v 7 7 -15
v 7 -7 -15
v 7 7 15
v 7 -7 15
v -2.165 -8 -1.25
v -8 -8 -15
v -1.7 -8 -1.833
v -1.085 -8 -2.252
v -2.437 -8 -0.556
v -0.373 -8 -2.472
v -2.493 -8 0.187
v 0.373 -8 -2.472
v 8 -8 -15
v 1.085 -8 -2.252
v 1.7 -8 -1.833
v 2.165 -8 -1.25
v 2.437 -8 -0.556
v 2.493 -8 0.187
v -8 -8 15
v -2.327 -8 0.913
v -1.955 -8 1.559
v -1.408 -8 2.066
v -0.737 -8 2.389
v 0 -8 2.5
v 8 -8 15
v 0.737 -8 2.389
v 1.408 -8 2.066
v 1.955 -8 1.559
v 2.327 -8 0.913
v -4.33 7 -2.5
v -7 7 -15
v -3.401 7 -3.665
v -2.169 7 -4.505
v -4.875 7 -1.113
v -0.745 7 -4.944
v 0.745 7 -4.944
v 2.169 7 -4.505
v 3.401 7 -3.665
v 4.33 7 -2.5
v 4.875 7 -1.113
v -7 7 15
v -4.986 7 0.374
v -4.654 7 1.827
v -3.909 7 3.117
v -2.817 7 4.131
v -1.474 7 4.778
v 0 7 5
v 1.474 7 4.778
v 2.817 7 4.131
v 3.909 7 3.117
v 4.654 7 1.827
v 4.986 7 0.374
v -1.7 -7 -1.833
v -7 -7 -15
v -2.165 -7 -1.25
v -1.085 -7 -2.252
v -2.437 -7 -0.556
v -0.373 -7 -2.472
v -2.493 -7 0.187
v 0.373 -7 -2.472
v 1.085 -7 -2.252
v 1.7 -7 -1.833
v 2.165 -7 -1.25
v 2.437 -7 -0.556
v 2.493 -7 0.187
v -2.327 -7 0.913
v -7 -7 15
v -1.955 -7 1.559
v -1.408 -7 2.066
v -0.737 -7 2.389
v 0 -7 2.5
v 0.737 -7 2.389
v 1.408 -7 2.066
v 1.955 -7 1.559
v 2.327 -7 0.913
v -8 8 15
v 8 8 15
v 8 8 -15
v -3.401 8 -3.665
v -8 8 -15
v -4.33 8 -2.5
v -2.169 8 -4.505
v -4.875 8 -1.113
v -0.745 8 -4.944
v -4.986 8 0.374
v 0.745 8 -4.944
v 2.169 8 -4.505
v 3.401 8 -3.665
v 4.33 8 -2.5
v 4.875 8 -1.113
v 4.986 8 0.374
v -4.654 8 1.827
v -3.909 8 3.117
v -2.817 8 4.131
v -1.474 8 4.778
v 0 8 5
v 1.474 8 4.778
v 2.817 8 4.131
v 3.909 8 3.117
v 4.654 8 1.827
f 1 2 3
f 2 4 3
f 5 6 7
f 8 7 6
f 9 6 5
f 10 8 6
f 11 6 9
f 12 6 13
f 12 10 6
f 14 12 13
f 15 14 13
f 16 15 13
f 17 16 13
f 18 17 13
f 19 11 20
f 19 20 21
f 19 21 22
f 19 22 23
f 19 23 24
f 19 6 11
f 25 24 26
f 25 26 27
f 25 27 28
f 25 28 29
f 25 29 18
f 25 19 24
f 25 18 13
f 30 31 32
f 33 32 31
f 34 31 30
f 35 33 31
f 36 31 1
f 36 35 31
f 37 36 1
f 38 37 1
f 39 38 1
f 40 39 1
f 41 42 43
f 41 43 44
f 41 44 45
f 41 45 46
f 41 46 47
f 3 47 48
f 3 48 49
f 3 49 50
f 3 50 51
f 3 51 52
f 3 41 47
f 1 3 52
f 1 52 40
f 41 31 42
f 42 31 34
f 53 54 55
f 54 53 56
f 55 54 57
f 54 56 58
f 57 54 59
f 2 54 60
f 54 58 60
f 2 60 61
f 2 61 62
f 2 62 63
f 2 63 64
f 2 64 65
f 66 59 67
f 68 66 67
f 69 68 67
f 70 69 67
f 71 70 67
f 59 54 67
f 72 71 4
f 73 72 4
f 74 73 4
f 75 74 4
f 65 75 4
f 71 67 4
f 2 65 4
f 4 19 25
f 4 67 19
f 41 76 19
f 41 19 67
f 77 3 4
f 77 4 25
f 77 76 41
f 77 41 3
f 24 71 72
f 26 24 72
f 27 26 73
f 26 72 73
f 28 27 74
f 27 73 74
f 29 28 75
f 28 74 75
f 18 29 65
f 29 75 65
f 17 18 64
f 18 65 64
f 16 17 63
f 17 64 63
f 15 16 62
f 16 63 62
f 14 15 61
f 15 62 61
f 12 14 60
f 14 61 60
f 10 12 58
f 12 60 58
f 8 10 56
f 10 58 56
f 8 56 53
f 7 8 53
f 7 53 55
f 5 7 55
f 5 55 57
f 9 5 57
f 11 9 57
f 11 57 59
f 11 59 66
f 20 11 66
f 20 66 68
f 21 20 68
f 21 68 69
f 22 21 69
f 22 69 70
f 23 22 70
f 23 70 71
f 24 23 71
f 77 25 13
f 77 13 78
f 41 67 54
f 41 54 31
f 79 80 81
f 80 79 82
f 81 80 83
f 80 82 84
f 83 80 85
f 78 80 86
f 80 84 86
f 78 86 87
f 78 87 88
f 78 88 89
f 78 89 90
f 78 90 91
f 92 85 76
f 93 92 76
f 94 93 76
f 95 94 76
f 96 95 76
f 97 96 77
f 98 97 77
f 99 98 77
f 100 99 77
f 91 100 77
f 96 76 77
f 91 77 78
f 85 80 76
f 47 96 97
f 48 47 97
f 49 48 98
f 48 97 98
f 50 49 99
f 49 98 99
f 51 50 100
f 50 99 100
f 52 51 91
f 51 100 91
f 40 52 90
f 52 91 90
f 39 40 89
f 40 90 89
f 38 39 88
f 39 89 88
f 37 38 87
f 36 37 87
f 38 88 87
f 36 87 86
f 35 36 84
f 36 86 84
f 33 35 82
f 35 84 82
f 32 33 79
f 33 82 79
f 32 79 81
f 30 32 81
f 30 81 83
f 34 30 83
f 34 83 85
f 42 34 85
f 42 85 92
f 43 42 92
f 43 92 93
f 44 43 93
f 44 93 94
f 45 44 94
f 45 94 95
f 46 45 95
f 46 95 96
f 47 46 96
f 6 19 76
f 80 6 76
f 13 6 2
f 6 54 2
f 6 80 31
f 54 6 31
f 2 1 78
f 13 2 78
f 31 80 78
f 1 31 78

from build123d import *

# Parameters (mm, degrees)
SKIZZE1_W                       = 16
SKIZZE1_H                       = 16
SKIZZE1_W_2                     = 14
SKIZZE1_H_2                     = 14
AUFSATZ_LINEAR_AUSTRAGEN1_DEPTH = 15
SKIZZE2_R                       = 2.5
SCHNITT_LINEAR_AUSTRAGEN1_DEPTH = 30
SKIZZE3_R                       = 5
SCHNITT_LINEAR_AUSTRAGEN2_DEPTH = 5


with BuildPart() as part:
    # Skizze1 → Aufsatz-Linear austragen1 (new, symmetric)
    with BuildSketch(Plane.XY):
        Rectangle(SKIZZE1_W, SKIZZE1_H)
        Rectangle(SKIZZE1_W_2, SKIZZE1_H_2, mode=Mode.SUBTRACT)
    extrude(amount=AUFSATZ_LINEAR_AUSTRAGEN1_DEPTH, both=True)

    # Skizze2 → Schnitt-Linear austragen1 (cut)
    with BuildSketch(Plane(origin=(0, 8, 0), x_dir=(1, 0, 0), z_dir=(0, 1, 0))):
        with Locations(Location((0, 0, 0), (0, 0, 270))):
            Circle(SKIZZE2_R)
    extrude(amount=-SCHNITT_LINEAR_AUSTRAGEN1_DEPTH, mode=Mode.SUBTRACT)

    # Skizze3 → Schnitt-Linear austragen2 (cut)
    with BuildSketch(Plane(origin=(0, 8, 0), x_dir=(1, 0, 0), z_dir=(0, 1, 0))):
        with Locations(Location((0, 0, 0), (0, 0, 270))):
            Circle(SKIZZE3_R)
    extrude(amount=-SCHNITT_LINEAR_AUSTRAGEN2_DEPTH, mode=Mode.SUBTRACT)


solid = part.part
